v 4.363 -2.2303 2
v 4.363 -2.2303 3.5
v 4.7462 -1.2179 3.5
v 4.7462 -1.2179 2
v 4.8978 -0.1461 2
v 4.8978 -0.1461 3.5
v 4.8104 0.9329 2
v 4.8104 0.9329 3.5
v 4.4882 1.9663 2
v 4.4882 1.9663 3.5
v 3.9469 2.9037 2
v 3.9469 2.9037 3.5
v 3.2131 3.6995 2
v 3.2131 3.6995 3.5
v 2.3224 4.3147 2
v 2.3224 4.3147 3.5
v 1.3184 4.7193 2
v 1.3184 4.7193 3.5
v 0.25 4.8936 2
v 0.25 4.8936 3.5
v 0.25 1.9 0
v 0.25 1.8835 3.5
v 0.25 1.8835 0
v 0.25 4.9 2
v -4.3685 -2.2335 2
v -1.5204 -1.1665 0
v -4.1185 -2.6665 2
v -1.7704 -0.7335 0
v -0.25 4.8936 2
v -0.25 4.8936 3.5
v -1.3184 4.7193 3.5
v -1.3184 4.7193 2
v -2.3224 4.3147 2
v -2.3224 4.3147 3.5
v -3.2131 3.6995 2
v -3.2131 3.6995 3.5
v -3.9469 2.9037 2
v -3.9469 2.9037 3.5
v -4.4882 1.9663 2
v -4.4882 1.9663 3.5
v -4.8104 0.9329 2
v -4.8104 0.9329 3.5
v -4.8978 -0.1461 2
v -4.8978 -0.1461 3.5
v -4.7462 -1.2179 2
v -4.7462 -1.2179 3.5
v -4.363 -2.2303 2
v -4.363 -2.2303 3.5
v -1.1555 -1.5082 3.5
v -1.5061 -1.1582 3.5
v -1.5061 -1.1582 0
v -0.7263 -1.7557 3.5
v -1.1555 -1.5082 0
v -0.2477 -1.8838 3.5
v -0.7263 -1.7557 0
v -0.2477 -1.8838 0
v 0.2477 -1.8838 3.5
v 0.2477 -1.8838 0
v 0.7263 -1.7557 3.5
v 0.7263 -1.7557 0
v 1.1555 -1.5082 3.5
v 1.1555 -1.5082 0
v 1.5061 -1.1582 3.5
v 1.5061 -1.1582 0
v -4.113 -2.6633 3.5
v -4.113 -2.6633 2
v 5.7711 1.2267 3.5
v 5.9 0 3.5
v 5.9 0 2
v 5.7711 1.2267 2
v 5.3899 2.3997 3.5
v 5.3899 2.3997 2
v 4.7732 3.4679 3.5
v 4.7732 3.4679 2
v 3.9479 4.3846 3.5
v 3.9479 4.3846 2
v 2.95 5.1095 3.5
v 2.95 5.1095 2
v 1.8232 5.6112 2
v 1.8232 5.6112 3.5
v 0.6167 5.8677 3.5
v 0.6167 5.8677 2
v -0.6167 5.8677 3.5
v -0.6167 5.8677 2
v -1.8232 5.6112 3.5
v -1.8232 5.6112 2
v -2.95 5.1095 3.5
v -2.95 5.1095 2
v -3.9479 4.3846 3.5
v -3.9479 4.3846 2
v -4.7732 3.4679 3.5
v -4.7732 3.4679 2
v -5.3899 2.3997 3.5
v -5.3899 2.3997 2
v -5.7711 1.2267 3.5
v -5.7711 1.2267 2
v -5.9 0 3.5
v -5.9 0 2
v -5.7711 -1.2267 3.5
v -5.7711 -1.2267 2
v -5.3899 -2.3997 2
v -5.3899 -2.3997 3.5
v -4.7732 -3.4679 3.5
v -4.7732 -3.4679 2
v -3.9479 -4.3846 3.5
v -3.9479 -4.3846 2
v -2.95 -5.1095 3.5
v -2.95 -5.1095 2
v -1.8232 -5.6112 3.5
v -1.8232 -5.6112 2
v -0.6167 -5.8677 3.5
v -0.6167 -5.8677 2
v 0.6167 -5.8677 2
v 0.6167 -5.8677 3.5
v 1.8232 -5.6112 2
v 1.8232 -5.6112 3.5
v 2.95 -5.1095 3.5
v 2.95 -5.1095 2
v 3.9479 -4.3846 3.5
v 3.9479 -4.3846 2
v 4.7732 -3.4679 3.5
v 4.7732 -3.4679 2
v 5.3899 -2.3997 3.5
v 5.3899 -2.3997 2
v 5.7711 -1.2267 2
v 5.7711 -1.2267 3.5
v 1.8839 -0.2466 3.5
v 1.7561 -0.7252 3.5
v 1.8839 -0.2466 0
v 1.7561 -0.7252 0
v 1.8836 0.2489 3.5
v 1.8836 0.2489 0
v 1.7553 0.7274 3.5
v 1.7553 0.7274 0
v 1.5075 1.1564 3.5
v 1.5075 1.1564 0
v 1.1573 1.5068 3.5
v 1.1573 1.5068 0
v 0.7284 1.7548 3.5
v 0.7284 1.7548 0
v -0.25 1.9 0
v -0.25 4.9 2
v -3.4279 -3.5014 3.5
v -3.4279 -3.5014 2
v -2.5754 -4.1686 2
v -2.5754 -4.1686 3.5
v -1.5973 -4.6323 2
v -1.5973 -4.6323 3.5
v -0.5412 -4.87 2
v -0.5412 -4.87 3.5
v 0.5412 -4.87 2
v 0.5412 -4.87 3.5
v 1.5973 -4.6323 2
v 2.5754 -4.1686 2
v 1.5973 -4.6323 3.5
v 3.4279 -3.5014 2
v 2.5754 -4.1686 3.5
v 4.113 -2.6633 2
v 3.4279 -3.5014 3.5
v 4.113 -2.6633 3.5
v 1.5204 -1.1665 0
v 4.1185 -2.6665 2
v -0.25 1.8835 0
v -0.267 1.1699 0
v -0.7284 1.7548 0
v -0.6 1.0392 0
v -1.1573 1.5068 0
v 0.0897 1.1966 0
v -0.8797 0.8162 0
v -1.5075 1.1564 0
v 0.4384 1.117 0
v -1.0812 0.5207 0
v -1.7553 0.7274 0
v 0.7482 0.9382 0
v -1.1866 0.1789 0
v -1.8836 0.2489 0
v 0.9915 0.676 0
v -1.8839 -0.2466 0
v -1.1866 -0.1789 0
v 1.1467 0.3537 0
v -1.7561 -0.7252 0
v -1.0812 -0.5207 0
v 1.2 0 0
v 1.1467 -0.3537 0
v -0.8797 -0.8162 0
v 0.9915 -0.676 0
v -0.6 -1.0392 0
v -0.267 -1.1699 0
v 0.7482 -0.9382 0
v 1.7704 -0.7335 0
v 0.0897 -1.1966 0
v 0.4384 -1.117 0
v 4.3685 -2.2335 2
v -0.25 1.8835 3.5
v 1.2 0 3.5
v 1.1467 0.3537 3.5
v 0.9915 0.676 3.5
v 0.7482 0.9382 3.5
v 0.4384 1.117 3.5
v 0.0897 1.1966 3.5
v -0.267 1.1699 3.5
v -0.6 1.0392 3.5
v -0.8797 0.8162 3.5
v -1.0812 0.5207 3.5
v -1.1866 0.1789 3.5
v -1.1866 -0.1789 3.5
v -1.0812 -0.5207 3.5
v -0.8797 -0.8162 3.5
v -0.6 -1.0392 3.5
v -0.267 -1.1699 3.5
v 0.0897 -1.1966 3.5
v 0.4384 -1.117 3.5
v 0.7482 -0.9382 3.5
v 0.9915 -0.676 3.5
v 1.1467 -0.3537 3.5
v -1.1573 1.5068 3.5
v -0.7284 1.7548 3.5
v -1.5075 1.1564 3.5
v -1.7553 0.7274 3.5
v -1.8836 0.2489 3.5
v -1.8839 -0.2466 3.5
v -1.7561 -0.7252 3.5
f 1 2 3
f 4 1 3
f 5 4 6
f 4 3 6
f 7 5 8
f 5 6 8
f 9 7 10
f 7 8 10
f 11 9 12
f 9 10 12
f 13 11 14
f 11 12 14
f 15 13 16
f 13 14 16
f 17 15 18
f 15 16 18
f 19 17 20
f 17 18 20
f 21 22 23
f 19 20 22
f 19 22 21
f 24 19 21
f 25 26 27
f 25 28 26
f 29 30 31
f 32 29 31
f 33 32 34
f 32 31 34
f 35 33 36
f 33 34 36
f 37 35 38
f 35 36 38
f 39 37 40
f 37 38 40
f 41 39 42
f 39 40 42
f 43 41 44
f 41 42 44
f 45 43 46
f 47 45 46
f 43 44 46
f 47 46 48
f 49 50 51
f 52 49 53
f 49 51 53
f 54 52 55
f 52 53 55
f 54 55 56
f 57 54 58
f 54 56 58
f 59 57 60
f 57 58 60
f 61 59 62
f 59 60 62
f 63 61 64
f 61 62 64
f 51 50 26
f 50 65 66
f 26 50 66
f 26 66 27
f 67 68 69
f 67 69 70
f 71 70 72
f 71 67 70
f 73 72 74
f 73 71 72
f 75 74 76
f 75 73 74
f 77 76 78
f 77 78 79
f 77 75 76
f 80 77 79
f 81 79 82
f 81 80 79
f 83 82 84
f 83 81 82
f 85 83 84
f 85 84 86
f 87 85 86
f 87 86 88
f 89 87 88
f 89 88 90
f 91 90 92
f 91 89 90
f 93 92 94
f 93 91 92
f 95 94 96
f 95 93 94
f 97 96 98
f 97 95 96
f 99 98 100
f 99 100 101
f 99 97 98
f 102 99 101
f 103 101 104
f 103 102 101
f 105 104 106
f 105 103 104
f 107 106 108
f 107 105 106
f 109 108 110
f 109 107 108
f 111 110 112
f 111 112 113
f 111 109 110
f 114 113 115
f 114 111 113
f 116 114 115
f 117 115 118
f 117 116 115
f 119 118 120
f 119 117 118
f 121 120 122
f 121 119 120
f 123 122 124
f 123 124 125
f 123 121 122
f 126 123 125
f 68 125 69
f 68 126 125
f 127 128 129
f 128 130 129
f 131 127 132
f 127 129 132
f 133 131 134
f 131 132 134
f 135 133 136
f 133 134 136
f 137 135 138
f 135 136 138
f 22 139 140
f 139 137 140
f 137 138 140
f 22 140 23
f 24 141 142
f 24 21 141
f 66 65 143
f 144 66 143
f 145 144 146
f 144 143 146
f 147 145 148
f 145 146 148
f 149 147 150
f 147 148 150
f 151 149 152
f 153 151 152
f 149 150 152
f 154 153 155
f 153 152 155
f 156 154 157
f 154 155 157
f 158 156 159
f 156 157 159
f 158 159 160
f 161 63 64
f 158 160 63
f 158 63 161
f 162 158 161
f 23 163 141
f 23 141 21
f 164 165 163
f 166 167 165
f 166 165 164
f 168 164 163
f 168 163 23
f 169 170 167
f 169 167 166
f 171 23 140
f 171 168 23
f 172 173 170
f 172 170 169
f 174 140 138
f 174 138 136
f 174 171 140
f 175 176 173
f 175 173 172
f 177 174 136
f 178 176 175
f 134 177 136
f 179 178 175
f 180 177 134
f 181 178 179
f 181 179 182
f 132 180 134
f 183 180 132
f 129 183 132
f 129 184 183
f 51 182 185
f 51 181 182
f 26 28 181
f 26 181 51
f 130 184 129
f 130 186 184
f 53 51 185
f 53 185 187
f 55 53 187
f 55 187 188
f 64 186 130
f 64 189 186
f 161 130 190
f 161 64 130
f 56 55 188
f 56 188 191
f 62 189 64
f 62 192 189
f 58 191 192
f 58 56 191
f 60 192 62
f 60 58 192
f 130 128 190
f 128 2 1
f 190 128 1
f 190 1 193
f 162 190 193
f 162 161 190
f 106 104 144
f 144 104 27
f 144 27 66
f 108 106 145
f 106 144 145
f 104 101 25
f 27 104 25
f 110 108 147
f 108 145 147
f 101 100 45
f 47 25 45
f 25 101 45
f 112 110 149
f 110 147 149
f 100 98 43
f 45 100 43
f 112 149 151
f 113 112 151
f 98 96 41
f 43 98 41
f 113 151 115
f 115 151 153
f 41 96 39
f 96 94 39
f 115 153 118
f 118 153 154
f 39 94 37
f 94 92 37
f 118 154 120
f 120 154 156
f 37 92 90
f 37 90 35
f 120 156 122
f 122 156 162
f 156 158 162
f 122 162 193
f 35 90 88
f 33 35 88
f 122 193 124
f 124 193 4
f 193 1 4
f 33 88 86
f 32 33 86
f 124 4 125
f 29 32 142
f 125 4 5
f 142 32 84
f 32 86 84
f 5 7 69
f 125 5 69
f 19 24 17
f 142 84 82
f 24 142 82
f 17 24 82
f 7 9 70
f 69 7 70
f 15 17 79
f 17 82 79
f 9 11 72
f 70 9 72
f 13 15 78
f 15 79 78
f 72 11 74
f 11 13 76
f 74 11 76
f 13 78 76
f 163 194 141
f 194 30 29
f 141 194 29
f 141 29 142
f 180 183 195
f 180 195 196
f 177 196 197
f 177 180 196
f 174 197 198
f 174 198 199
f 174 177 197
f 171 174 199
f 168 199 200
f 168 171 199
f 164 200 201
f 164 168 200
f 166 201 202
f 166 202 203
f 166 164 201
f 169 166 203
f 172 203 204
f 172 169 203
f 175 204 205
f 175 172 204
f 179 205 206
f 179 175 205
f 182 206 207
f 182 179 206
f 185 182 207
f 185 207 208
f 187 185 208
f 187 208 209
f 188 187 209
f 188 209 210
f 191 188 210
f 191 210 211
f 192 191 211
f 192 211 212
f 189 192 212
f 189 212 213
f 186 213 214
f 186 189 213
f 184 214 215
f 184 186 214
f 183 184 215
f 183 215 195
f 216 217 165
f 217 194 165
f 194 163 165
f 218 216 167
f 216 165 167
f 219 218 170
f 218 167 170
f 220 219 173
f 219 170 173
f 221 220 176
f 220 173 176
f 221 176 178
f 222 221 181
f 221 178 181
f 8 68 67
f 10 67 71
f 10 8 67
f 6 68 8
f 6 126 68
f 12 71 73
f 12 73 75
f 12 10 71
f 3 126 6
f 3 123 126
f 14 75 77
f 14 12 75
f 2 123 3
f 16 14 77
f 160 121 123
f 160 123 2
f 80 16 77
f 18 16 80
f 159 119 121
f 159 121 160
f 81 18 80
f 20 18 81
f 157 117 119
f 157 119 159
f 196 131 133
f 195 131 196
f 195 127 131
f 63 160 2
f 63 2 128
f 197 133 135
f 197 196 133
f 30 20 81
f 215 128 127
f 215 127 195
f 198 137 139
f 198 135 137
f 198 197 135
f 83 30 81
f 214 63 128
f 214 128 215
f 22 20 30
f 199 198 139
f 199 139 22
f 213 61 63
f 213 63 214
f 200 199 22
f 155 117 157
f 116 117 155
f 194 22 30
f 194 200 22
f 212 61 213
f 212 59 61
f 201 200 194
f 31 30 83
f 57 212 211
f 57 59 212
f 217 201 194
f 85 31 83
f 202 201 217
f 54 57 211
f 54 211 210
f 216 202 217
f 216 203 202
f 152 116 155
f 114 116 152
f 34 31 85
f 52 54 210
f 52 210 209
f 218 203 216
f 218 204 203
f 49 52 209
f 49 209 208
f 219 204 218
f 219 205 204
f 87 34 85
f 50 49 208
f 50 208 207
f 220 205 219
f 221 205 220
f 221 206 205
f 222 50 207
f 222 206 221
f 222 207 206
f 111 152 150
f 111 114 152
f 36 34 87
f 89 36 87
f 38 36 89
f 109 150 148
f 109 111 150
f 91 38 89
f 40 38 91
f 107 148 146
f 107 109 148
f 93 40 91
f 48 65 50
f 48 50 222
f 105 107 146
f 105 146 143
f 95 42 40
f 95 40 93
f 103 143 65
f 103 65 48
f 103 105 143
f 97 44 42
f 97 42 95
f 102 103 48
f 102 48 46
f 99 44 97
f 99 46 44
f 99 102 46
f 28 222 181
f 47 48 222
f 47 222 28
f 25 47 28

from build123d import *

# Parameters (mm, degrees)
SKETCH1_R           = 1.9
SKETCH1_R_2         = 1.2
BOSS_EXTRUDE1_DEPTH = 3.5
SKETCH2_R           = 5.9
SKETCH2_R_2         = 4.9
BOSS_EXTRUDE2_DEPTH = 1.5
BOSS_EXTRUDE3_DEPTH = 0.25
CIRPATTERN1_COUNT   = 3


with BuildPart() as part:
    # Sketch1 → Boss-Extrude1 (new body)
    with BuildSketch(Plane.XY):
        Circle(SKETCH1_R)
        Circle(SKETCH1_R_2, mode=Mode.SUBTRACT)
    extrude(amount=BOSS_EXTRUDE1_DEPTH)



with BuildPart() as body_2:
    # Sketch2 → Boss-Extrude2 (new body)
    with BuildSketch(Plane.XY.offset(3.5)):
        Circle(SKETCH2_R)
        Circle(SKETCH2_R_2, mode=Mode.SUBTRACT)
    extrude(amount=-BOSS_EXTRUDE2_DEPTH)


with BuildPart() as part_1:
    add(part.part)

    add(body_2.part)  # Boss-Extrude3 merges body 2
    # Sketch3 → Boss-Extrude3 (add, symmetric)
    with BuildSketch(Plane(origin=(0, 0, 0), x_dir=(0, 0, -1), z_dir=(1, 0, 0))):
        Polygon((0, 1.9), (-2, 4.9), (-3.5, 4.9), (-3.5, 1.9), (-3.5, 1.7), (0, 1.7), align=None)
    boss_extrude3 = extrude(amount=BOSS_EXTRUDE3_DEPTH, both=True)

    # CirPattern1: Boss-Extrude3 ×3 about axis
    cirpattern1_axis = Axis((0, 0, 0), (0, 0, 1))
    for i in range(1, CIRPATTERN1_COUNT):
        add(boss_extrude3.rotate(cirpattern1_axis, i * 360 / CIRPATTERN1_COUNT))


solid = part_1.part
